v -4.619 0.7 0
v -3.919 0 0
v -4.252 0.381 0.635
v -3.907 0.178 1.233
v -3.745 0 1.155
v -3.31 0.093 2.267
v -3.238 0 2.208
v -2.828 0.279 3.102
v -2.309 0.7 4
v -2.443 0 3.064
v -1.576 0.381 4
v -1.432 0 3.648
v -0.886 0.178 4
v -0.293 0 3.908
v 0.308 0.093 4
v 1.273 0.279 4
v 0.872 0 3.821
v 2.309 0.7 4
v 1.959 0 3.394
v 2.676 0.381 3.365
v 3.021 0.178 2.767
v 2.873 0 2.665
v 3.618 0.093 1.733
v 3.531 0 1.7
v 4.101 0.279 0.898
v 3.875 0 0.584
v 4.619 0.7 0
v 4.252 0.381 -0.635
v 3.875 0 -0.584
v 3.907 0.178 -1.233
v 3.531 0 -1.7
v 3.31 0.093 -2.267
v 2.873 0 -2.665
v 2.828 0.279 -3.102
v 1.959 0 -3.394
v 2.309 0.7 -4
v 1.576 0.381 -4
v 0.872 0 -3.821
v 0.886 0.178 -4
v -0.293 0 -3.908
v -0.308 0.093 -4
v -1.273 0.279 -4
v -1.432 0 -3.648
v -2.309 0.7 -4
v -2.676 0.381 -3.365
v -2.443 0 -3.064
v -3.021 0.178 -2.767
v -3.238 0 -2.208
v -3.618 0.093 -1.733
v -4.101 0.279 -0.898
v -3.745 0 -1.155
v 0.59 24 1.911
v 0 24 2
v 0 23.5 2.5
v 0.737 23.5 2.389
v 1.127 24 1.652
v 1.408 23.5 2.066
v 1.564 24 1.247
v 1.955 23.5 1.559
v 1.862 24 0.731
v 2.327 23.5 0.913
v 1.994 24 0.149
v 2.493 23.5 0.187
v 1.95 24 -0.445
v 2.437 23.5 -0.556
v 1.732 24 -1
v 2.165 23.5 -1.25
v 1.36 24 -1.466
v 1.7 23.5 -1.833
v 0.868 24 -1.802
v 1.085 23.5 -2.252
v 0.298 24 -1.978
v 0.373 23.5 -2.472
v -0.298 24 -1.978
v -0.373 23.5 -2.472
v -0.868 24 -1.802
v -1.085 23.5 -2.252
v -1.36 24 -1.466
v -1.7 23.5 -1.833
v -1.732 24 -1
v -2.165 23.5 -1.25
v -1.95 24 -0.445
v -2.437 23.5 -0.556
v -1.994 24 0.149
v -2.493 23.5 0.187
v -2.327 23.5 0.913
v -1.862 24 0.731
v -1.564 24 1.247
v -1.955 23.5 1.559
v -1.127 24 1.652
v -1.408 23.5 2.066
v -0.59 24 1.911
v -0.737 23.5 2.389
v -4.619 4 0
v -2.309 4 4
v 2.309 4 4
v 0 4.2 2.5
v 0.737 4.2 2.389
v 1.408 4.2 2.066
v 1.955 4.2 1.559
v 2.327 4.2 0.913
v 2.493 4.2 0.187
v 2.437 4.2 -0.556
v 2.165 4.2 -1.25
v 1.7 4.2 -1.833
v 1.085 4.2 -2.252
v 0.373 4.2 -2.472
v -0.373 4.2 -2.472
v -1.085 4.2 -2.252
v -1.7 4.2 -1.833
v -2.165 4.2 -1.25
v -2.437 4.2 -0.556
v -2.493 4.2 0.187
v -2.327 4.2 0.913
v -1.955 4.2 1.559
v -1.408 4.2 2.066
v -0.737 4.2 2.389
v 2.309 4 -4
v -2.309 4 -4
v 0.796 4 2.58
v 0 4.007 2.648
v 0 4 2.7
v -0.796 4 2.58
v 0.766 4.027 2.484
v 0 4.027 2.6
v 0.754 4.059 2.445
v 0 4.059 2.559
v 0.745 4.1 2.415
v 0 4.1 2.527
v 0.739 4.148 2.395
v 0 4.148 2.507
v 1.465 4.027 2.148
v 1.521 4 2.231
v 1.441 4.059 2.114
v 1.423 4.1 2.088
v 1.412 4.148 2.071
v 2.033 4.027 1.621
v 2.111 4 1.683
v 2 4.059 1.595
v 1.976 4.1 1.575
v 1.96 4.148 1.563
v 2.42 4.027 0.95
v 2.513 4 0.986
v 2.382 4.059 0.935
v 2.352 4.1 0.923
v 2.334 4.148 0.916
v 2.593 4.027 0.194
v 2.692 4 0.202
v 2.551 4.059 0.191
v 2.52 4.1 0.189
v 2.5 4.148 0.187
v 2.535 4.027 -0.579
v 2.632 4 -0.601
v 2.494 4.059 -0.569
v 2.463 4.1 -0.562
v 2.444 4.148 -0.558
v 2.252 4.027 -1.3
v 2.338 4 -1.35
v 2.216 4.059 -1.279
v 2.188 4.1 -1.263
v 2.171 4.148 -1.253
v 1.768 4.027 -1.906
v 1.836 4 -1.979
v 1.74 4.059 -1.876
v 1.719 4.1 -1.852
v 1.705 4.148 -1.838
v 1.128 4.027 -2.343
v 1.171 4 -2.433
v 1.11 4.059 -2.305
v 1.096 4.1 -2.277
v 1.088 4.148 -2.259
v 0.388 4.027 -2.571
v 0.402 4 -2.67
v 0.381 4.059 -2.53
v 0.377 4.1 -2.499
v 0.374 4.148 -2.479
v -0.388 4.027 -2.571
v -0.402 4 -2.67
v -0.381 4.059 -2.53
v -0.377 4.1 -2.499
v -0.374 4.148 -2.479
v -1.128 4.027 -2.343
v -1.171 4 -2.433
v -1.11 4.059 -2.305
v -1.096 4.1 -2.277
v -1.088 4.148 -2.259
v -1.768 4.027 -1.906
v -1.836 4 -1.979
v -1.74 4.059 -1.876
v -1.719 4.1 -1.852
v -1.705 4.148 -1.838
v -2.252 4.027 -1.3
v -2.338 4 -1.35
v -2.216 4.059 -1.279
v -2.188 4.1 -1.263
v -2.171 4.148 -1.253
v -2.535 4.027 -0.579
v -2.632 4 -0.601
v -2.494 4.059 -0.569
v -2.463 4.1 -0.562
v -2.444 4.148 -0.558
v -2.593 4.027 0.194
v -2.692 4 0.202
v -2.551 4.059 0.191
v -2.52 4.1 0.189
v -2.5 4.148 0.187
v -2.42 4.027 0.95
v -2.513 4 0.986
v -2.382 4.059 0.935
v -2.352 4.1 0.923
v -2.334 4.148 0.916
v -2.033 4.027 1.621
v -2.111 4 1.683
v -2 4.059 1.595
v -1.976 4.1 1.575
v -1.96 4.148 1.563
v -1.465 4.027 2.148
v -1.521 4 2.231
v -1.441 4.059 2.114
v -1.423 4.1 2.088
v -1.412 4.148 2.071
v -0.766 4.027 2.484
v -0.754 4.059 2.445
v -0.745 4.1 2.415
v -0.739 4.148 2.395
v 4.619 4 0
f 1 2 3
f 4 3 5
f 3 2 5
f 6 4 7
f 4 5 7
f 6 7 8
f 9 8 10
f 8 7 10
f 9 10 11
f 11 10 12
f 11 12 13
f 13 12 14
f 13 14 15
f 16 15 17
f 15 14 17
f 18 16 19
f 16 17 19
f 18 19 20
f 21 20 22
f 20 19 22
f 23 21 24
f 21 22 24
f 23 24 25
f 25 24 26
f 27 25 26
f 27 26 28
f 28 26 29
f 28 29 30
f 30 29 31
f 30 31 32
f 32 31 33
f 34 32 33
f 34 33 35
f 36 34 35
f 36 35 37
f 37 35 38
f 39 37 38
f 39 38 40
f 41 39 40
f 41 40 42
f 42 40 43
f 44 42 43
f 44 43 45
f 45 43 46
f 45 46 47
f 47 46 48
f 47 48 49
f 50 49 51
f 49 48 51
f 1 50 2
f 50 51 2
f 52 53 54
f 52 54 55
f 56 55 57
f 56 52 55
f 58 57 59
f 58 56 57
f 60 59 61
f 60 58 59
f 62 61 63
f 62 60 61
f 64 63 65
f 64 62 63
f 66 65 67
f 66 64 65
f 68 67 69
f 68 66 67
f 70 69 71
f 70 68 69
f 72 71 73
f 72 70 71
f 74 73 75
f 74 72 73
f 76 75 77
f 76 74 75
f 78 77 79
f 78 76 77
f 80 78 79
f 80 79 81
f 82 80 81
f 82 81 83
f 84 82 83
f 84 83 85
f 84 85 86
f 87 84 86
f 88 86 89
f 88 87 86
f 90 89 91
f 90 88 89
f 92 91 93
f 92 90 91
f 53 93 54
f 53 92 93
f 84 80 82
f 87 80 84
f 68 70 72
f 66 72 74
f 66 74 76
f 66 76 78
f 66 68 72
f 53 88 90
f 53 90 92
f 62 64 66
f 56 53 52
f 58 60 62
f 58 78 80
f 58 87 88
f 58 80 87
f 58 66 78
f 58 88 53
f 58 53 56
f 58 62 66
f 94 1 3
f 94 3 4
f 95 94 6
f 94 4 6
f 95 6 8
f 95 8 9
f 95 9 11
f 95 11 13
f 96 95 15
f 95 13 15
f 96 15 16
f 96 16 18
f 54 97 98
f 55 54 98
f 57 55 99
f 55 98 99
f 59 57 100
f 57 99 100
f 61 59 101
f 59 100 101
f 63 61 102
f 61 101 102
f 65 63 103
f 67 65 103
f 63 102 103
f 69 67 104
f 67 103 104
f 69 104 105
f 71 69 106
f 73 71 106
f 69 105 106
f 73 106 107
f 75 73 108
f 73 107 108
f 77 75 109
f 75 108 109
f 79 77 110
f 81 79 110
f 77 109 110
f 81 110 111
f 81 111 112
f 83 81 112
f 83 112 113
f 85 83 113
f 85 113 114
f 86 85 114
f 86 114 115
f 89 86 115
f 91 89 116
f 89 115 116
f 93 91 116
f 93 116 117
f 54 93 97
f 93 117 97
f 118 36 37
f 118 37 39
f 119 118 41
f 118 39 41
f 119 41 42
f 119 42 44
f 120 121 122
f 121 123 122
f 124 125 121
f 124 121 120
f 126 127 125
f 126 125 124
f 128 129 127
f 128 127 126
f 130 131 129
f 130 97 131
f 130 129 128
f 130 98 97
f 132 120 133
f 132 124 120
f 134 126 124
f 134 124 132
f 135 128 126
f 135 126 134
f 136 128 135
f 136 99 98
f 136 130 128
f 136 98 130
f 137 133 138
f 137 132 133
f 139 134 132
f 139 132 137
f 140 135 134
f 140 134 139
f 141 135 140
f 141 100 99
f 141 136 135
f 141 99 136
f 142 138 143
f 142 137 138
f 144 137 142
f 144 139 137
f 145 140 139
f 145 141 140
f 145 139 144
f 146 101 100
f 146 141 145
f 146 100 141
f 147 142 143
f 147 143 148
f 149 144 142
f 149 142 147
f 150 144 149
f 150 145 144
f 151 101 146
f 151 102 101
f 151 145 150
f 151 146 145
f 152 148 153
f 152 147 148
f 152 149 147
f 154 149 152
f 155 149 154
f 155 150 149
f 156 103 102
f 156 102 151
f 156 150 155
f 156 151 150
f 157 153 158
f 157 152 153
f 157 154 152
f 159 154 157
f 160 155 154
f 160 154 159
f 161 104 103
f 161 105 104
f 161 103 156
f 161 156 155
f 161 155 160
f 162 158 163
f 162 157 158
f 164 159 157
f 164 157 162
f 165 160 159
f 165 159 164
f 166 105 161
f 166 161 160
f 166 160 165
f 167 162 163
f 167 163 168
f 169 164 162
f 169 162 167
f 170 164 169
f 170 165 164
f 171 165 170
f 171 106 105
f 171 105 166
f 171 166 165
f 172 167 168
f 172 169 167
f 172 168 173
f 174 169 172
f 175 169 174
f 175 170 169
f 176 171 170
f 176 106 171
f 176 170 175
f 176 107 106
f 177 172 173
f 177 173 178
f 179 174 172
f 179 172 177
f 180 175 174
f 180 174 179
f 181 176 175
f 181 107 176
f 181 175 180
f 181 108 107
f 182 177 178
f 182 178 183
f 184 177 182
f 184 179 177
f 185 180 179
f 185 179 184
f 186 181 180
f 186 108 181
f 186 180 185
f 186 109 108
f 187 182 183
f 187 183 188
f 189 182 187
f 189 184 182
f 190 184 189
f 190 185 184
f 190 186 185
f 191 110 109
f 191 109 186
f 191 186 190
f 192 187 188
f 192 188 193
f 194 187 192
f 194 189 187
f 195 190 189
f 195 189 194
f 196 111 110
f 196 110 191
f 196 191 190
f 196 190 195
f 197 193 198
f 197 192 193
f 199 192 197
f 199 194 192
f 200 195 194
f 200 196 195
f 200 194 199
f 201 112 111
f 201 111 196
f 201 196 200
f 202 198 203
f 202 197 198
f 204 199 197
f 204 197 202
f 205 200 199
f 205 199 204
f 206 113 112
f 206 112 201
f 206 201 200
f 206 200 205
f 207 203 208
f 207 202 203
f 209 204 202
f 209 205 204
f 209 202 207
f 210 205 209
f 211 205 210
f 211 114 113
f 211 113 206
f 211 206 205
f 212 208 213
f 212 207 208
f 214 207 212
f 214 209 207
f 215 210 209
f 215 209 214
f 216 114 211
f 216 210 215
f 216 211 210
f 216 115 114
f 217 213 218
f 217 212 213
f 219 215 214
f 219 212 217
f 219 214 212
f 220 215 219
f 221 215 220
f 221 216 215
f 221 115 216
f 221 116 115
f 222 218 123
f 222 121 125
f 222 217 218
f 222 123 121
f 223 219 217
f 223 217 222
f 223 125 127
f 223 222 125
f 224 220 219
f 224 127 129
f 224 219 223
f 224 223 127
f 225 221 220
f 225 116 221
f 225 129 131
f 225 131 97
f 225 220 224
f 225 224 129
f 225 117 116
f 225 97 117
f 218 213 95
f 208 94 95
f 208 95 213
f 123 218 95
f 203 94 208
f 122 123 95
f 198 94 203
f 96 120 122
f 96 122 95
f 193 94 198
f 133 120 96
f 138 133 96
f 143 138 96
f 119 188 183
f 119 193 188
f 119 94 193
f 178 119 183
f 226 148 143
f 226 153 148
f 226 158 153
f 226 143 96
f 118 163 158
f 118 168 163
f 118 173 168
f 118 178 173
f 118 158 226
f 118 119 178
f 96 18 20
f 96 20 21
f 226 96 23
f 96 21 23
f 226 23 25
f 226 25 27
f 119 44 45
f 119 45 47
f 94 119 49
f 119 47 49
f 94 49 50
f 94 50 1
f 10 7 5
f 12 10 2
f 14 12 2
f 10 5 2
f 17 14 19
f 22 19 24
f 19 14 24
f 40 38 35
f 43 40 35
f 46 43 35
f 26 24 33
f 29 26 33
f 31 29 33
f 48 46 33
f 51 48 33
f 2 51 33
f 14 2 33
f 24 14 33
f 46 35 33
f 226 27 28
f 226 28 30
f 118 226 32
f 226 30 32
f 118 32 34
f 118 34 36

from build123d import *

# Parameters (mm, degrees)
BOSS_EXTRUDE1_DEPTH = 4
SKETCH2_R           = 2.5
BOSS_EXTRUDE2_DEPTH = 20
FILLET1_R           = 0.2
CHAMFER1_SIZE       = 0.5


with BuildPart() as part:
    # Sketch1 → Boss-Extrude1 (new body)
    with BuildSketch(Plane(origin=(0, 0, 0), x_dir=(1, 0, 0), z_dir=(0, 1, 0))):
        Polygon((4.618802154, 0), (2.309401077, 4), (-2.309401077, 4), (-4.618802154, 0), (-2.309401077, -4), (2.309401077, -4), align=None)
    extrude(amount=BOSS_EXTRUDE1_DEPTH)

    # Sketch2 → Boss-Extrude2 (add)
    with BuildSketch(Plane(origin=(0, 4, 0), x_dir=(1, 0, 0), z_dir=(0, 1, 0))):
        with Locations(Location((0, 0, 0), (0, 0, 270))):
            Circle(SKETCH2_R)
    extrude(amount=BOSS_EXTRUDE2_DEPTH)

    # Sketch3 → Cut-Revolve1 (revolve, cut)
    with BuildSketch(Plane.XY):
        Polygon((-4.618802154, 0.7), (-3.918802154, 0), (-4.618802154, 0), align=None)
    revolve(axis=Axis((0, -1000, 0), (0, 1, 0)), mode=Mode.SUBTRACT)

    # Fillet1
    fillet1_edges = [part.edges().sort_by_distance(p)[0] for p in [
        (0, 4, -2.5),
    ]]
    fillet(fillet1_edges, radius=FILLET1_R)

    # Chamfer1
    chamfer1_edges = [part.edges().sort_by_distance(p)[0] for p in [
        (0, 24, -2.5),
    ]]
    chamfer(chamfer1_edges, length=CHAMFER1_SIZE)


solid = part.part
